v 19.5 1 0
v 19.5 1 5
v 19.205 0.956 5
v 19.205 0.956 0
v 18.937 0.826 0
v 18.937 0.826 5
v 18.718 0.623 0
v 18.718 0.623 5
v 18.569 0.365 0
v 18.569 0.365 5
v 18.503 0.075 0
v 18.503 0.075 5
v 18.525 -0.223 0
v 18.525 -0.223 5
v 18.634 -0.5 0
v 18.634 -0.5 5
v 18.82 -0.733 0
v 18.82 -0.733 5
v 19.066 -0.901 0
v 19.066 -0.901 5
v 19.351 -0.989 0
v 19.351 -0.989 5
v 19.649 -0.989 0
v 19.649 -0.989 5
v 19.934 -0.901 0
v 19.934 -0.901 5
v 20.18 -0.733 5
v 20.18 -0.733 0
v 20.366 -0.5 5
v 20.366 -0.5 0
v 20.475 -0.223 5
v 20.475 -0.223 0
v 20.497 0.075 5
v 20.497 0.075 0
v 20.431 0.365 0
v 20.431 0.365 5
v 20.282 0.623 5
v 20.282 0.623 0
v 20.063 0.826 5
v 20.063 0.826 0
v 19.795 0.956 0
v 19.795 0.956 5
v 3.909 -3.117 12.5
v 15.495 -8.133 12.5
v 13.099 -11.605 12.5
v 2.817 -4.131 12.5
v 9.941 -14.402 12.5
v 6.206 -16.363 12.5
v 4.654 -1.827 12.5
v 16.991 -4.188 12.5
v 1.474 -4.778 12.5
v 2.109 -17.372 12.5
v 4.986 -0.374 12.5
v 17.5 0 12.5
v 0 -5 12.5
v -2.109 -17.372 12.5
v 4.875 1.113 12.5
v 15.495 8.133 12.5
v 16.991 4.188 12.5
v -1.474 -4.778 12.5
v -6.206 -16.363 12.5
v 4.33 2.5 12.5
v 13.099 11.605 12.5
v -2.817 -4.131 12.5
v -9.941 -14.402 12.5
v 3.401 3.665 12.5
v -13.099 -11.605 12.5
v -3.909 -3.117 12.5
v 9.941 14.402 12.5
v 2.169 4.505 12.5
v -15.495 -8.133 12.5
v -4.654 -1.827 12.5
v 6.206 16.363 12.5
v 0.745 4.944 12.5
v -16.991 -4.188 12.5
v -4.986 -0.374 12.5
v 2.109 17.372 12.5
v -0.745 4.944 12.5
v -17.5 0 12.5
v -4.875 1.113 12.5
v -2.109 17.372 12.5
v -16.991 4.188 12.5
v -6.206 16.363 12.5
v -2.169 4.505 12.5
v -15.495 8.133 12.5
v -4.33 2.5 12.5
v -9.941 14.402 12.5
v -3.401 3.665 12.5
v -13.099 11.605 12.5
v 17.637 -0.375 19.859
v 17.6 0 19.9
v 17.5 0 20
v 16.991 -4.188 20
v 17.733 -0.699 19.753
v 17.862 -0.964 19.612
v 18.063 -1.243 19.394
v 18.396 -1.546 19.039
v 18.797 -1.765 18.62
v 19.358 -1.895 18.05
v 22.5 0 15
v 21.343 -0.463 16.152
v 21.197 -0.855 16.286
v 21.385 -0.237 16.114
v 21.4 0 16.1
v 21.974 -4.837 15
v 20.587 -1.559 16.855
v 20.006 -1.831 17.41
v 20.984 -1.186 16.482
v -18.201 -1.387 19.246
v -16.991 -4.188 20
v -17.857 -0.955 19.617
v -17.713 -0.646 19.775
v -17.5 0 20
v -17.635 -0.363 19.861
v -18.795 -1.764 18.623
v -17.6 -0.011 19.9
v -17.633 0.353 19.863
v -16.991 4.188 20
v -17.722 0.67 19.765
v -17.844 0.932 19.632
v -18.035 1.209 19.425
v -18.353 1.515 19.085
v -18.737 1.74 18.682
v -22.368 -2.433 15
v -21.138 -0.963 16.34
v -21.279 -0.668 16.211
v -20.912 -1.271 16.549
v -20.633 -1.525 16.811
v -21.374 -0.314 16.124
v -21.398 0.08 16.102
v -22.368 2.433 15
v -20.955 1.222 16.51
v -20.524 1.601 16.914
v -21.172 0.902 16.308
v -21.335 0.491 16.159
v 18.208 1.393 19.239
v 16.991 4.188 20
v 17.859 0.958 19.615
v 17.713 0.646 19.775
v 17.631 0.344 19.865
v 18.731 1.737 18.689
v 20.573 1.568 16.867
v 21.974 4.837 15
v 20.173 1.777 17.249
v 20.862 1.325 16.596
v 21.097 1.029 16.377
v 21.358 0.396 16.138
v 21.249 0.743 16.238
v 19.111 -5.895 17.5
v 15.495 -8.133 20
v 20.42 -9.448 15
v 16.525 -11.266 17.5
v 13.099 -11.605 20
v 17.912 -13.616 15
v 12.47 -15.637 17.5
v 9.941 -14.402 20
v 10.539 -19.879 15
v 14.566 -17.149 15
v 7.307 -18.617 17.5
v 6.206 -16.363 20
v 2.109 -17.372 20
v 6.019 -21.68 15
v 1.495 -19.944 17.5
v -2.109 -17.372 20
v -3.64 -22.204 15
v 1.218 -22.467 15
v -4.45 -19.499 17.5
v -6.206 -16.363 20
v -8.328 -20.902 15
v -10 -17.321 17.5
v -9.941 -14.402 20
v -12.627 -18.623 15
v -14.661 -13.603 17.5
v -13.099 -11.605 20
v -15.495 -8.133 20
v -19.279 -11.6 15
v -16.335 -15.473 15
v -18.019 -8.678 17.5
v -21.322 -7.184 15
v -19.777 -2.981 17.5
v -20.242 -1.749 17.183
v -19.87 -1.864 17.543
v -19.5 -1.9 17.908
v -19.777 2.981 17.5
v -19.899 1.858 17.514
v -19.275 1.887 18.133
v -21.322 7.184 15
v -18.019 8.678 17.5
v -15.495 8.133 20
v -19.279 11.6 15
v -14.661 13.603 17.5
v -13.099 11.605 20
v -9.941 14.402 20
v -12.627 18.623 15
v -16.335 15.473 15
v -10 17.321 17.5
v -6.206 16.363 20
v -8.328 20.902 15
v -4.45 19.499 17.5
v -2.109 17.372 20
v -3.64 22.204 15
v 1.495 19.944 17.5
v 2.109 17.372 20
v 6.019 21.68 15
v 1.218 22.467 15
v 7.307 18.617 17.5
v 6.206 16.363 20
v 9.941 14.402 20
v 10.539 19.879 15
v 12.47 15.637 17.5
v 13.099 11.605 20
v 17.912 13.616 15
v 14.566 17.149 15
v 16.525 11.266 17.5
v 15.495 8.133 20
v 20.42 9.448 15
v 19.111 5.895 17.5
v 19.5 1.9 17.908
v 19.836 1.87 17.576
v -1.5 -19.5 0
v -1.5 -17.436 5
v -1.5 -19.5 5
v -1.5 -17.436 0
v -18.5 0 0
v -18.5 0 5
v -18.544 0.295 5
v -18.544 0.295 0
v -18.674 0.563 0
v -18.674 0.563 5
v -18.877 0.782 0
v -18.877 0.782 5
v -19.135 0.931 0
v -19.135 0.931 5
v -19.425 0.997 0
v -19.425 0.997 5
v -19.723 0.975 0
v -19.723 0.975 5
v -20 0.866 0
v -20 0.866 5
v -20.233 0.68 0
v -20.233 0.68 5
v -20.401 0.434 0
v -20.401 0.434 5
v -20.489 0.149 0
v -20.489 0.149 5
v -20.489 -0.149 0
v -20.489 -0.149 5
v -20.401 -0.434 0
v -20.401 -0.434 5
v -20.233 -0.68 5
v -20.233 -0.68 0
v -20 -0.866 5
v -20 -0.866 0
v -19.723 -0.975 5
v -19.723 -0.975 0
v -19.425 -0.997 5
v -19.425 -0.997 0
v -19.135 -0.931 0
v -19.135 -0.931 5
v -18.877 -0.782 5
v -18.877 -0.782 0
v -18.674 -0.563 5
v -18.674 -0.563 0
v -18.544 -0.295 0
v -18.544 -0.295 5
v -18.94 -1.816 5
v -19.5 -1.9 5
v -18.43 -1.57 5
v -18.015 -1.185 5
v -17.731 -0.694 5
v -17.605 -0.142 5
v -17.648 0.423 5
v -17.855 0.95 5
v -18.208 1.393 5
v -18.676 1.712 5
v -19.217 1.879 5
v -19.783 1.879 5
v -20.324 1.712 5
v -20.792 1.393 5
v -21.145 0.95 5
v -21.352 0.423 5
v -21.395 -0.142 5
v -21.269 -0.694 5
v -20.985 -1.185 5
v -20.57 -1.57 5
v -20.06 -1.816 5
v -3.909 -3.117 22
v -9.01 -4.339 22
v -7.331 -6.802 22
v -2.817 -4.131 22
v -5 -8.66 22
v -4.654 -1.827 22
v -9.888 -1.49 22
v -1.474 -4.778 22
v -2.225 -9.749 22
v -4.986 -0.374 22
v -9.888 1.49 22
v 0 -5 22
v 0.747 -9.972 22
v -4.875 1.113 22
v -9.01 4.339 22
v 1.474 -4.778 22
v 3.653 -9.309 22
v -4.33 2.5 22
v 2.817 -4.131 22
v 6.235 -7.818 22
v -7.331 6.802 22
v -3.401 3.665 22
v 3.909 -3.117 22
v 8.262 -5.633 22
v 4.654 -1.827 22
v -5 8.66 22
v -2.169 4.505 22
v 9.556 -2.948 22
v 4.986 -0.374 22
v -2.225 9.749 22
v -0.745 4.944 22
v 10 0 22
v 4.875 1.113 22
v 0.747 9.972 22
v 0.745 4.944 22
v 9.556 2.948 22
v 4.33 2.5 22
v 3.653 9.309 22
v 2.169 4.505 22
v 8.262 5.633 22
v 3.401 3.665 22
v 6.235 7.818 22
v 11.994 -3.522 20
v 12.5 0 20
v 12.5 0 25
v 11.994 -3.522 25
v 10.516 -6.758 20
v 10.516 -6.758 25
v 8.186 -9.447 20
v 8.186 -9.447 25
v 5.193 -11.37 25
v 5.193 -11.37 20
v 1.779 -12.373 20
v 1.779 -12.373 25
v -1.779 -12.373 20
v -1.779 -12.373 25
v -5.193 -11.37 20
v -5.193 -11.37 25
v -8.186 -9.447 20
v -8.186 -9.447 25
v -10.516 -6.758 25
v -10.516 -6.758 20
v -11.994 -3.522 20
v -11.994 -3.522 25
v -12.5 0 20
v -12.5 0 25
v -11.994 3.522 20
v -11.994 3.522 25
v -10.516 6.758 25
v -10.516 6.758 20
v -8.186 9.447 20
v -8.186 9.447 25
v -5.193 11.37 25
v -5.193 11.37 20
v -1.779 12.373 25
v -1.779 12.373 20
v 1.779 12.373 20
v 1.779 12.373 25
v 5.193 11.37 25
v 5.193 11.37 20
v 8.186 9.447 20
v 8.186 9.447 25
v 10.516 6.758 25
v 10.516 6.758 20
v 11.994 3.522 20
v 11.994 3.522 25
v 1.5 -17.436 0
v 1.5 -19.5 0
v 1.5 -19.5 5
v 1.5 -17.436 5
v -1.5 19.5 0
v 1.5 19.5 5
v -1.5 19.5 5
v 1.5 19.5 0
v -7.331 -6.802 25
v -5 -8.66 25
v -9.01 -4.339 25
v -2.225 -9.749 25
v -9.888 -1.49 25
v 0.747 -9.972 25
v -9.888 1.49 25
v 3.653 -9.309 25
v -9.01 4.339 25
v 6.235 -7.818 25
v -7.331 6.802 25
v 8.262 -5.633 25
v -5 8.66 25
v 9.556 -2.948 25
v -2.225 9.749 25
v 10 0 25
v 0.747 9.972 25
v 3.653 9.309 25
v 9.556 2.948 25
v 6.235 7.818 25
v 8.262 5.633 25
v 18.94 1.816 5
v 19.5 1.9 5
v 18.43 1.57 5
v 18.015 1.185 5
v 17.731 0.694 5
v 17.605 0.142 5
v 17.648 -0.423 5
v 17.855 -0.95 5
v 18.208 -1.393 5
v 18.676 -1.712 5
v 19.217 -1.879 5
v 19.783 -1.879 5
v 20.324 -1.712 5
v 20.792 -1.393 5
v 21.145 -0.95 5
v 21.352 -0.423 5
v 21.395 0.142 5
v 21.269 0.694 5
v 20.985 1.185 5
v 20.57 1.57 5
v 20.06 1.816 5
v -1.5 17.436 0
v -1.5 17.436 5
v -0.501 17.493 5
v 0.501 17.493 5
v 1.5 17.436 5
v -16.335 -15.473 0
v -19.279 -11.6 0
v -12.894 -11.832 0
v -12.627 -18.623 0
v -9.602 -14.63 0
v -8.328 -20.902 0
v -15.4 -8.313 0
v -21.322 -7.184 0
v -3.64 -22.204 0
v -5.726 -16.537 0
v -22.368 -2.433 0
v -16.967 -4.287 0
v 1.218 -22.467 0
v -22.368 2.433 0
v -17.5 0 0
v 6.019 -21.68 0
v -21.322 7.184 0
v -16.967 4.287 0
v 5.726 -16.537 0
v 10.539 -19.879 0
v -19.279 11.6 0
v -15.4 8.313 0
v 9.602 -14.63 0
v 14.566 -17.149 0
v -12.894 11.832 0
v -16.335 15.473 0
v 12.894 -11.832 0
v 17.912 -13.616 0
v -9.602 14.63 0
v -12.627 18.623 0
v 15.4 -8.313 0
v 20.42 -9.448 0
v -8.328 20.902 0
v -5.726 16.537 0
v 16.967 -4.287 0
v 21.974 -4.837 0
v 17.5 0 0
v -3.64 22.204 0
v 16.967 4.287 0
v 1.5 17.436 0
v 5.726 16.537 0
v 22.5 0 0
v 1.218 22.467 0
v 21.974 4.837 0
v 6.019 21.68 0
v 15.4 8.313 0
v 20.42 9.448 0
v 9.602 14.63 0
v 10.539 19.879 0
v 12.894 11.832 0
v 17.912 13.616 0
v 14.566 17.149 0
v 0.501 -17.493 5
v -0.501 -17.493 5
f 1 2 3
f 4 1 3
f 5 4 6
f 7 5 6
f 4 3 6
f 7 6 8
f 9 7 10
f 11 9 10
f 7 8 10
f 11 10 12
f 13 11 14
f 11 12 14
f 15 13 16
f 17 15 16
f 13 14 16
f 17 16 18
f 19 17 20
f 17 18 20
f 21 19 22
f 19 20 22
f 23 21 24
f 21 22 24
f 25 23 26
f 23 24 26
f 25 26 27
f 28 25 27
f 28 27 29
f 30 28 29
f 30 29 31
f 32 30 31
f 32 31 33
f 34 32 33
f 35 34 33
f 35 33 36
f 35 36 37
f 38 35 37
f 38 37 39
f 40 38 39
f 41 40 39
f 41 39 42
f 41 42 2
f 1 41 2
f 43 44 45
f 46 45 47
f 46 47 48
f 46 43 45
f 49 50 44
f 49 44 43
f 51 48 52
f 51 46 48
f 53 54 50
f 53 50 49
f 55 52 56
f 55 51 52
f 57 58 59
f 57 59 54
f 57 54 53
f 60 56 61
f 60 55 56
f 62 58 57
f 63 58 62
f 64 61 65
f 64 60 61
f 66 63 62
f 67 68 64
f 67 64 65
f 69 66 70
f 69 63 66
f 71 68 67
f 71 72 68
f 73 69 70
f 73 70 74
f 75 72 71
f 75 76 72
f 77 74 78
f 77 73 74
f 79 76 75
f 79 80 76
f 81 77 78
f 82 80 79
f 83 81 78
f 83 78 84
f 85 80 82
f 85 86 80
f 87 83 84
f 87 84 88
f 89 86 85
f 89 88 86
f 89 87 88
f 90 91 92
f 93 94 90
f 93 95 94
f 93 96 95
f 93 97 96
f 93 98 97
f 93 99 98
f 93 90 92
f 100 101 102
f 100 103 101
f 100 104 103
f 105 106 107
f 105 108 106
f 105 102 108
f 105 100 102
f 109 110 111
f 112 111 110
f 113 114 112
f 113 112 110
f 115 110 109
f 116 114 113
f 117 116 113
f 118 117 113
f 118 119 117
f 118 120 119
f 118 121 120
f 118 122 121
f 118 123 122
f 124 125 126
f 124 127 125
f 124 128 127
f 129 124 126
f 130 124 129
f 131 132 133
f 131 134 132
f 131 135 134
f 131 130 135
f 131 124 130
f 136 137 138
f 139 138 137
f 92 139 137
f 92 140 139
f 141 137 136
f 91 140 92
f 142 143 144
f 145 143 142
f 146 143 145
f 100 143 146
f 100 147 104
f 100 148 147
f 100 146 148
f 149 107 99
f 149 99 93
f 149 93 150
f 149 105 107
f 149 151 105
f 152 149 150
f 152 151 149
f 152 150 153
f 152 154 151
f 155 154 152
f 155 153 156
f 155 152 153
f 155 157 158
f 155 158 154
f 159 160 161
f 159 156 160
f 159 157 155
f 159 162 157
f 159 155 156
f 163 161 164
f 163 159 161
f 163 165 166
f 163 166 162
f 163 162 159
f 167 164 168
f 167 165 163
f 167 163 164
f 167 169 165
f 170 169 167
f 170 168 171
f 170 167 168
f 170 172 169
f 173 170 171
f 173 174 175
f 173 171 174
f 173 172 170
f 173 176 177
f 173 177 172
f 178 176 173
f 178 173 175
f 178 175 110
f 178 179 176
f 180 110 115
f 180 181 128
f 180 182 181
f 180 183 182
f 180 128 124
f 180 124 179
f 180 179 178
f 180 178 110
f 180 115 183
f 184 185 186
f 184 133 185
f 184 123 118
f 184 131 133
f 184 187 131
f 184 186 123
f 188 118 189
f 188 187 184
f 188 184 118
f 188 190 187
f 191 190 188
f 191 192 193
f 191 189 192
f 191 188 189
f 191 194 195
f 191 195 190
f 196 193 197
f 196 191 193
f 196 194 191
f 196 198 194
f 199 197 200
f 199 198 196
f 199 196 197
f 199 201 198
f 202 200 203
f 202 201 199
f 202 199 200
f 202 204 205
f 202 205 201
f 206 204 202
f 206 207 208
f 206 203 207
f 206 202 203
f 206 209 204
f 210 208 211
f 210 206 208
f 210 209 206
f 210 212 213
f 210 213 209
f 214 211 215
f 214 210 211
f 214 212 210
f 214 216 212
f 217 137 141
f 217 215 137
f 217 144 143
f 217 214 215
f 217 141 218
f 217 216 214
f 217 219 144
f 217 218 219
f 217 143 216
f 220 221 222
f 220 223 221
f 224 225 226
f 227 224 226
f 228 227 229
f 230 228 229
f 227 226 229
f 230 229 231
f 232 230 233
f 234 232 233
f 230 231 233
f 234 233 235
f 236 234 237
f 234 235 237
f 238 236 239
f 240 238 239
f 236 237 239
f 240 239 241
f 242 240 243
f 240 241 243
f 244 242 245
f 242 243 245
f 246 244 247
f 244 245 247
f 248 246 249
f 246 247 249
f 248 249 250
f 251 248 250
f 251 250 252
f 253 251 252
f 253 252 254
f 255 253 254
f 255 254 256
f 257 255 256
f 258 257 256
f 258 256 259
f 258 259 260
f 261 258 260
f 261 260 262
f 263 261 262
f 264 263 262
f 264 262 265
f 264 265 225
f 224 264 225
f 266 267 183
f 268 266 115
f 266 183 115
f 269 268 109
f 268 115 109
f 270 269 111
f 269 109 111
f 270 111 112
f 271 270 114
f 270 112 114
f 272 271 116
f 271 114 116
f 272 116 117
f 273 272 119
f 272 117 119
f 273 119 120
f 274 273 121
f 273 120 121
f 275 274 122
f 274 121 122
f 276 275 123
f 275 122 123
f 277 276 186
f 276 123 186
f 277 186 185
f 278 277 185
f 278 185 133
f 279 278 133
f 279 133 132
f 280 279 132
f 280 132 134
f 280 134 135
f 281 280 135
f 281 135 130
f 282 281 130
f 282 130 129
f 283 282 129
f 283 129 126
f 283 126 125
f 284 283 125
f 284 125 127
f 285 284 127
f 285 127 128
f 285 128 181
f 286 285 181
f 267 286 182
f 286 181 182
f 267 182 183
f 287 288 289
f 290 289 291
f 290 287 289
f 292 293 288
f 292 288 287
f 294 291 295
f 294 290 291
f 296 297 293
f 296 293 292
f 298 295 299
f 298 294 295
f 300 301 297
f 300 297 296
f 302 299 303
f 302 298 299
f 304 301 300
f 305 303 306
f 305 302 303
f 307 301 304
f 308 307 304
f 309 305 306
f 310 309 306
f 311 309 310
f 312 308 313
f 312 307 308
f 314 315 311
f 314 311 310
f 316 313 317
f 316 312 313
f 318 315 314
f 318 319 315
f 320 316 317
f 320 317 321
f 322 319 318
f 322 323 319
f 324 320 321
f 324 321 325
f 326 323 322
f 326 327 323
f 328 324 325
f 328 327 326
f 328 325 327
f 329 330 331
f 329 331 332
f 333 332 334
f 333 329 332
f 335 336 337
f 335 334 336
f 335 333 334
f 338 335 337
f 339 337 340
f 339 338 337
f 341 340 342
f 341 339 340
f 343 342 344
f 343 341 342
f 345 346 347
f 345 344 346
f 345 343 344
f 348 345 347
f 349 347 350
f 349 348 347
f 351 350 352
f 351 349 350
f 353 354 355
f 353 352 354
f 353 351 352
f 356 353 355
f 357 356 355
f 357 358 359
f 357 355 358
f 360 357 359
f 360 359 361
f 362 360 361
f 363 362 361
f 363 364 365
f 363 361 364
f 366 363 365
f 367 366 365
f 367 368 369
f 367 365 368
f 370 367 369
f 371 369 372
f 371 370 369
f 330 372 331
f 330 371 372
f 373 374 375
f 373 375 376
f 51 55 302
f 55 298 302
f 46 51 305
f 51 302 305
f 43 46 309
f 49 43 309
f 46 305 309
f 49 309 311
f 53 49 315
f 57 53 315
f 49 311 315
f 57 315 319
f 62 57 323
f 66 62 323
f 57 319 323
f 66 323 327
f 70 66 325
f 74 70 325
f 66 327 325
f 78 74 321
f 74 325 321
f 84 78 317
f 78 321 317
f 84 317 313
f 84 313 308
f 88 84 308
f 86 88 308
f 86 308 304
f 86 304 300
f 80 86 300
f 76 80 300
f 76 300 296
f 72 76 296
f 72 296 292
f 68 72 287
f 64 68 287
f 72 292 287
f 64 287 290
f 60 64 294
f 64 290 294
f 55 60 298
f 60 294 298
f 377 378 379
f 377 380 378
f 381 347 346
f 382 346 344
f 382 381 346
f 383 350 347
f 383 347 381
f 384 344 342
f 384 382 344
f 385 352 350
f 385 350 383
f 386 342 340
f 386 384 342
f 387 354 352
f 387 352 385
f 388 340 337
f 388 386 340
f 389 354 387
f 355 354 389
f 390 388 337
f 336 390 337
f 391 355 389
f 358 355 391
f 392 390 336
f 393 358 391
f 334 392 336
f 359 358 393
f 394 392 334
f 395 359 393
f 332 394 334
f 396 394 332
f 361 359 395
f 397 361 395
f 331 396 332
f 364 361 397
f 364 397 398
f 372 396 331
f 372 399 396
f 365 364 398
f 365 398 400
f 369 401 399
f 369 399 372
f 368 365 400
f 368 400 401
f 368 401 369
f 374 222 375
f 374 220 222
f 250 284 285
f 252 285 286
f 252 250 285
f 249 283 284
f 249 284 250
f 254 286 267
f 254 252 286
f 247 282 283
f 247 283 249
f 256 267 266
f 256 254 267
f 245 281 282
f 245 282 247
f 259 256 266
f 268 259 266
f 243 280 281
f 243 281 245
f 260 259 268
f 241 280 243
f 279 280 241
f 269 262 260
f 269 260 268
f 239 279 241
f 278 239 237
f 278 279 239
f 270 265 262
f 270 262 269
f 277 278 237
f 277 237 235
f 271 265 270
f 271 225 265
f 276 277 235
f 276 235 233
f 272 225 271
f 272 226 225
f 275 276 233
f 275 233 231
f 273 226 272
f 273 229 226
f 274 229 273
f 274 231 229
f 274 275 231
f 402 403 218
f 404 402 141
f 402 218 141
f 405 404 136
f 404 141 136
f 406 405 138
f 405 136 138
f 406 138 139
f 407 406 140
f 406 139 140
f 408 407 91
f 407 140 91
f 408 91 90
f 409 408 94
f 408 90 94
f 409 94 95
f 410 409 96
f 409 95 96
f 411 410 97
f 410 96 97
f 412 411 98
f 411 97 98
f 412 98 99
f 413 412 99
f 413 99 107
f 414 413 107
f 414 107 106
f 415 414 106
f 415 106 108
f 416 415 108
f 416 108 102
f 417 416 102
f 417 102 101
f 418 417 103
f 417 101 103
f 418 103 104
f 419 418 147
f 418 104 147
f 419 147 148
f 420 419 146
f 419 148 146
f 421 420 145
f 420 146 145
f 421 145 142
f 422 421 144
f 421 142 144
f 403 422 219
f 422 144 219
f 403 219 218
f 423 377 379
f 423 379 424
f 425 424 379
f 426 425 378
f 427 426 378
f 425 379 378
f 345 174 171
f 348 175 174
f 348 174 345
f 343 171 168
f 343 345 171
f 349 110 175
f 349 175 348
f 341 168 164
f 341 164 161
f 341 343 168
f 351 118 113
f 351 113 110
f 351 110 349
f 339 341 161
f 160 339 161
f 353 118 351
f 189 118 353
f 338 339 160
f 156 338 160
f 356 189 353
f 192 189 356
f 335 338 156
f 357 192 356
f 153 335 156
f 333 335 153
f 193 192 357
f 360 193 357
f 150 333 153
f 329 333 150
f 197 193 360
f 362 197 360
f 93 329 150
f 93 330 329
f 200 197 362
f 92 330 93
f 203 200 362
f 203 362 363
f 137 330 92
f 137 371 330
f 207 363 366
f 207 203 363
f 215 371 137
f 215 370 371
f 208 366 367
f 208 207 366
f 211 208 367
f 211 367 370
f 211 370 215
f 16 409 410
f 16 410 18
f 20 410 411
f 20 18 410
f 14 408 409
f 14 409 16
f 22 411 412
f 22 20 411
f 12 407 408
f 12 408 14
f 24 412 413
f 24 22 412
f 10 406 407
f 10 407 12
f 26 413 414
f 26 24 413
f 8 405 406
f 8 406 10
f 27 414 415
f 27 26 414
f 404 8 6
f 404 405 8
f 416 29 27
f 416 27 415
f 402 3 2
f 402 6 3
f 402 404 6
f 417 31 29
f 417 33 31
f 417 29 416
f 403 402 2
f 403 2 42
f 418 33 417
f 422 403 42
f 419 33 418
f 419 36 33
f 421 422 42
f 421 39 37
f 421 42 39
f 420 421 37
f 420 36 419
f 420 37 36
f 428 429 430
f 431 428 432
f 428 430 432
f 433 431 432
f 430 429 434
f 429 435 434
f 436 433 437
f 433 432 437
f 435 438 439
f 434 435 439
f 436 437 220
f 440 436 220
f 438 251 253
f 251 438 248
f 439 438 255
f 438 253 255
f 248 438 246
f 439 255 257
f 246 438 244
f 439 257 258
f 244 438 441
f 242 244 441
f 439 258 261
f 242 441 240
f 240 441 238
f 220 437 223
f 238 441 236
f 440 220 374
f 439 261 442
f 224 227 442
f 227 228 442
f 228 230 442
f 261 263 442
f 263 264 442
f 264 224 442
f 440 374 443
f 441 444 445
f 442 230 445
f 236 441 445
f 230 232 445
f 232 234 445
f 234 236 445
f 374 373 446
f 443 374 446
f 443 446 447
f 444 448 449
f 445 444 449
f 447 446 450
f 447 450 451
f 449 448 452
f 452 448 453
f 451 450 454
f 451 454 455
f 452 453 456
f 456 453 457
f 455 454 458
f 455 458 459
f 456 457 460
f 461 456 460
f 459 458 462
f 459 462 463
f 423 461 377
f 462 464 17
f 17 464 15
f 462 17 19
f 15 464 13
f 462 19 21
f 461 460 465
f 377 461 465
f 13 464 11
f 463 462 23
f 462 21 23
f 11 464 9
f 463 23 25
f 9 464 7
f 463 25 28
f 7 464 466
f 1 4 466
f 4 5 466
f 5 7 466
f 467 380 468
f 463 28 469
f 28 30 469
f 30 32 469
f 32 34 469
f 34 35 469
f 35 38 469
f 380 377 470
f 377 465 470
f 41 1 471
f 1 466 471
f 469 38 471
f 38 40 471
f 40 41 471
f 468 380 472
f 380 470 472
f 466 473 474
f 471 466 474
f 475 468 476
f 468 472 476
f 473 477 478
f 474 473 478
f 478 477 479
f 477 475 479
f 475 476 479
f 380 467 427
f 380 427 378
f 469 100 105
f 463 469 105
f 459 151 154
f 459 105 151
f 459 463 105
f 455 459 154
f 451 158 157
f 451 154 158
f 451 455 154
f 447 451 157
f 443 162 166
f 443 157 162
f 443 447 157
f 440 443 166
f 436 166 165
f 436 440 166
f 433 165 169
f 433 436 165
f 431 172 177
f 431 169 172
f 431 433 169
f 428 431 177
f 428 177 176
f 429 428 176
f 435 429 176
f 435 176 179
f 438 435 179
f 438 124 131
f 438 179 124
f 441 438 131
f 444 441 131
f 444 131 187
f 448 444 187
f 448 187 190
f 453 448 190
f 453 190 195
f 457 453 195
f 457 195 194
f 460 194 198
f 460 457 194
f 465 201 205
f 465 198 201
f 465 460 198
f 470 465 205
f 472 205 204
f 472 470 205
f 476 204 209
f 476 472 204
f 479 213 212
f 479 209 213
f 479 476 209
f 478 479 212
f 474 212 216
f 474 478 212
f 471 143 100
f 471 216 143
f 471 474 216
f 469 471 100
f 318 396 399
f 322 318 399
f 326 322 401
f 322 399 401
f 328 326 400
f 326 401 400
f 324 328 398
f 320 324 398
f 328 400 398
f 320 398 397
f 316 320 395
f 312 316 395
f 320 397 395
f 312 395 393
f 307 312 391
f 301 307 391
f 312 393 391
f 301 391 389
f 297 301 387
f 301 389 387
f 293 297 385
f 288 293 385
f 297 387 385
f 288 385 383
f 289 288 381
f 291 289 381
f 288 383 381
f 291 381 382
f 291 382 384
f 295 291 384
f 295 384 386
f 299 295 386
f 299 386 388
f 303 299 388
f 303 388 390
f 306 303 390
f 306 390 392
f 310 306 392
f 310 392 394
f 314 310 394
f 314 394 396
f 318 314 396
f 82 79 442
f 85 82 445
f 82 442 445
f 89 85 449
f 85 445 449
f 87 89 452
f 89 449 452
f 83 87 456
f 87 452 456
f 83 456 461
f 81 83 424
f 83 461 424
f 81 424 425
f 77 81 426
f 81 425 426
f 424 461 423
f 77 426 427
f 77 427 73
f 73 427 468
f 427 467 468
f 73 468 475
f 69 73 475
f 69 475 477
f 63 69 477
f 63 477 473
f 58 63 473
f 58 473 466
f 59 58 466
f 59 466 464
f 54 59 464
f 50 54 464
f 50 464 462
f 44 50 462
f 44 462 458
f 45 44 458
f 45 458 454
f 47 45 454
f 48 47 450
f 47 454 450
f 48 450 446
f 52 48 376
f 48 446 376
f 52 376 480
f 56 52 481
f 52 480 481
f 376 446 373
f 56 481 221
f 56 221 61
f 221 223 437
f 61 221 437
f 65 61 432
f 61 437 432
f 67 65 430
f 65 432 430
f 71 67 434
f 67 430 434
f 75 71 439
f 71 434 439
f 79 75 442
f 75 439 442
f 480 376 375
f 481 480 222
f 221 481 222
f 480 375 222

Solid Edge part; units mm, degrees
sketch "Sketch1" plane through (0, 0, 0) normal (0, 0, 1) x (1, 0, 0)
  circle A0 centre (0, 0) radius 22.5
  dimension "D1" = 45
extrude "Protrusion1" add sketch "Sketch1" along normal blind 20
sketch "Sketch2" plane through (0, 0, 20) normal (0, 0, 1) x (1, 0, 0)
  circle A0 centre (0, 0) radius 12.5
  dimension "D1" = 25
extrude "ProtrusioneEstrusa_2" add sketch "Sketch2" along normal blind 5
sketch "Sketch3" plane through (0, 0, 25) normal (0, 0, 1) x (1, 0, 0)
  circle A0 centre (0, 0) radius 10
  dimension "D1" = 20
extrude "ScavoEstrusione_1" cut sketch "Sketch3" against normal blind 3
chamfer "Smusso_1" distance 5 angle 45 1 edges at (-22.5, 0, 20)
sketch "Sketch4" plane through (0, 0, 22) normal (0, 0, 1) x (0, -1, 0)
  circle A0 centre (0, 0) radius 5
  dimension "D1" = 10
extrude "Cutout1" cut sketch "Sketch4" against normal through all
sketch "Sketch5" plane through (0, 0, 0) normal (0, 0, -1) x (-1, 0, 0)
  circle A0 centre (0, 0) radius 17.5
  dimension "D1" = 35
extrude "Scavo_Bobine" cut sketch "Sketch5" against normal blind 12.5
sketch "Sketch6" plane through (0, 0, 0) normal (0, 0, -1) x (0, -1, 0)
  line L0 (-14.5, -1.5) -> (-19.5, -1.5)
  line L1 (-19.5, -1.5) -> (-19.5, 1.5)
  line L2 (-19.5, 1.5) -> (-14.5, 1.5)
  line L3 (-14.5, 1.5) -> (-14.5, -1.5)
  dimension "D1" = 5
  dimension "D2" = 3
  dimension "D3" = 19.5
extrude "ScavoEstrusione_5" cut sketch "Sketch6" against normal blind 5
mirror "Mirror1" about plane through (0, 0, 0) normal (0, -1, 0) of "ScavoEstrusione_5"
sketch "Sketch7" plane through (0, 0, 25) normal (0, 0, 1) x (1, 0, 0)
  circle A0 centre (-19.5, 0) radius 1
  dimension "D1" = 2
  dimension "D2" = 19.5
extrude "Cutout2" cut sketch "Sketch7" against normal through all
sketch "Sketch8" plane through (0, 0, 25) normal (0, 0, 1) x (0, -1, 0)
  circle A0 centre (0, -19.5) radius 1.9
  dimension "D1" = 3.8
extrude "Scavo_Alloggio_vite" cut sketch "Sketch8" against normal blind 20
sketch "Sketch9" plane through (0, 0, 25) normal (0, 0, 1) x (0, 1, 0)
  circle A0 centre (0, -19.5) radius 1
  dimension "D1" = 2
  dimension "D2" = 19.5
extrude "Cutout3" cut sketch "Sketch9" against normal through all
sketch "Sketch10" plane through (0, 0, 25) normal (0, 0, 1) x (0, 1, 0)
  circle A0 centre (0, -19.5) radius 1.9
  dimension "D1" = 3.8
extrude "Scavo_Alloggio_vite_2" cut sketch "Sketch10" against normal blind 20
